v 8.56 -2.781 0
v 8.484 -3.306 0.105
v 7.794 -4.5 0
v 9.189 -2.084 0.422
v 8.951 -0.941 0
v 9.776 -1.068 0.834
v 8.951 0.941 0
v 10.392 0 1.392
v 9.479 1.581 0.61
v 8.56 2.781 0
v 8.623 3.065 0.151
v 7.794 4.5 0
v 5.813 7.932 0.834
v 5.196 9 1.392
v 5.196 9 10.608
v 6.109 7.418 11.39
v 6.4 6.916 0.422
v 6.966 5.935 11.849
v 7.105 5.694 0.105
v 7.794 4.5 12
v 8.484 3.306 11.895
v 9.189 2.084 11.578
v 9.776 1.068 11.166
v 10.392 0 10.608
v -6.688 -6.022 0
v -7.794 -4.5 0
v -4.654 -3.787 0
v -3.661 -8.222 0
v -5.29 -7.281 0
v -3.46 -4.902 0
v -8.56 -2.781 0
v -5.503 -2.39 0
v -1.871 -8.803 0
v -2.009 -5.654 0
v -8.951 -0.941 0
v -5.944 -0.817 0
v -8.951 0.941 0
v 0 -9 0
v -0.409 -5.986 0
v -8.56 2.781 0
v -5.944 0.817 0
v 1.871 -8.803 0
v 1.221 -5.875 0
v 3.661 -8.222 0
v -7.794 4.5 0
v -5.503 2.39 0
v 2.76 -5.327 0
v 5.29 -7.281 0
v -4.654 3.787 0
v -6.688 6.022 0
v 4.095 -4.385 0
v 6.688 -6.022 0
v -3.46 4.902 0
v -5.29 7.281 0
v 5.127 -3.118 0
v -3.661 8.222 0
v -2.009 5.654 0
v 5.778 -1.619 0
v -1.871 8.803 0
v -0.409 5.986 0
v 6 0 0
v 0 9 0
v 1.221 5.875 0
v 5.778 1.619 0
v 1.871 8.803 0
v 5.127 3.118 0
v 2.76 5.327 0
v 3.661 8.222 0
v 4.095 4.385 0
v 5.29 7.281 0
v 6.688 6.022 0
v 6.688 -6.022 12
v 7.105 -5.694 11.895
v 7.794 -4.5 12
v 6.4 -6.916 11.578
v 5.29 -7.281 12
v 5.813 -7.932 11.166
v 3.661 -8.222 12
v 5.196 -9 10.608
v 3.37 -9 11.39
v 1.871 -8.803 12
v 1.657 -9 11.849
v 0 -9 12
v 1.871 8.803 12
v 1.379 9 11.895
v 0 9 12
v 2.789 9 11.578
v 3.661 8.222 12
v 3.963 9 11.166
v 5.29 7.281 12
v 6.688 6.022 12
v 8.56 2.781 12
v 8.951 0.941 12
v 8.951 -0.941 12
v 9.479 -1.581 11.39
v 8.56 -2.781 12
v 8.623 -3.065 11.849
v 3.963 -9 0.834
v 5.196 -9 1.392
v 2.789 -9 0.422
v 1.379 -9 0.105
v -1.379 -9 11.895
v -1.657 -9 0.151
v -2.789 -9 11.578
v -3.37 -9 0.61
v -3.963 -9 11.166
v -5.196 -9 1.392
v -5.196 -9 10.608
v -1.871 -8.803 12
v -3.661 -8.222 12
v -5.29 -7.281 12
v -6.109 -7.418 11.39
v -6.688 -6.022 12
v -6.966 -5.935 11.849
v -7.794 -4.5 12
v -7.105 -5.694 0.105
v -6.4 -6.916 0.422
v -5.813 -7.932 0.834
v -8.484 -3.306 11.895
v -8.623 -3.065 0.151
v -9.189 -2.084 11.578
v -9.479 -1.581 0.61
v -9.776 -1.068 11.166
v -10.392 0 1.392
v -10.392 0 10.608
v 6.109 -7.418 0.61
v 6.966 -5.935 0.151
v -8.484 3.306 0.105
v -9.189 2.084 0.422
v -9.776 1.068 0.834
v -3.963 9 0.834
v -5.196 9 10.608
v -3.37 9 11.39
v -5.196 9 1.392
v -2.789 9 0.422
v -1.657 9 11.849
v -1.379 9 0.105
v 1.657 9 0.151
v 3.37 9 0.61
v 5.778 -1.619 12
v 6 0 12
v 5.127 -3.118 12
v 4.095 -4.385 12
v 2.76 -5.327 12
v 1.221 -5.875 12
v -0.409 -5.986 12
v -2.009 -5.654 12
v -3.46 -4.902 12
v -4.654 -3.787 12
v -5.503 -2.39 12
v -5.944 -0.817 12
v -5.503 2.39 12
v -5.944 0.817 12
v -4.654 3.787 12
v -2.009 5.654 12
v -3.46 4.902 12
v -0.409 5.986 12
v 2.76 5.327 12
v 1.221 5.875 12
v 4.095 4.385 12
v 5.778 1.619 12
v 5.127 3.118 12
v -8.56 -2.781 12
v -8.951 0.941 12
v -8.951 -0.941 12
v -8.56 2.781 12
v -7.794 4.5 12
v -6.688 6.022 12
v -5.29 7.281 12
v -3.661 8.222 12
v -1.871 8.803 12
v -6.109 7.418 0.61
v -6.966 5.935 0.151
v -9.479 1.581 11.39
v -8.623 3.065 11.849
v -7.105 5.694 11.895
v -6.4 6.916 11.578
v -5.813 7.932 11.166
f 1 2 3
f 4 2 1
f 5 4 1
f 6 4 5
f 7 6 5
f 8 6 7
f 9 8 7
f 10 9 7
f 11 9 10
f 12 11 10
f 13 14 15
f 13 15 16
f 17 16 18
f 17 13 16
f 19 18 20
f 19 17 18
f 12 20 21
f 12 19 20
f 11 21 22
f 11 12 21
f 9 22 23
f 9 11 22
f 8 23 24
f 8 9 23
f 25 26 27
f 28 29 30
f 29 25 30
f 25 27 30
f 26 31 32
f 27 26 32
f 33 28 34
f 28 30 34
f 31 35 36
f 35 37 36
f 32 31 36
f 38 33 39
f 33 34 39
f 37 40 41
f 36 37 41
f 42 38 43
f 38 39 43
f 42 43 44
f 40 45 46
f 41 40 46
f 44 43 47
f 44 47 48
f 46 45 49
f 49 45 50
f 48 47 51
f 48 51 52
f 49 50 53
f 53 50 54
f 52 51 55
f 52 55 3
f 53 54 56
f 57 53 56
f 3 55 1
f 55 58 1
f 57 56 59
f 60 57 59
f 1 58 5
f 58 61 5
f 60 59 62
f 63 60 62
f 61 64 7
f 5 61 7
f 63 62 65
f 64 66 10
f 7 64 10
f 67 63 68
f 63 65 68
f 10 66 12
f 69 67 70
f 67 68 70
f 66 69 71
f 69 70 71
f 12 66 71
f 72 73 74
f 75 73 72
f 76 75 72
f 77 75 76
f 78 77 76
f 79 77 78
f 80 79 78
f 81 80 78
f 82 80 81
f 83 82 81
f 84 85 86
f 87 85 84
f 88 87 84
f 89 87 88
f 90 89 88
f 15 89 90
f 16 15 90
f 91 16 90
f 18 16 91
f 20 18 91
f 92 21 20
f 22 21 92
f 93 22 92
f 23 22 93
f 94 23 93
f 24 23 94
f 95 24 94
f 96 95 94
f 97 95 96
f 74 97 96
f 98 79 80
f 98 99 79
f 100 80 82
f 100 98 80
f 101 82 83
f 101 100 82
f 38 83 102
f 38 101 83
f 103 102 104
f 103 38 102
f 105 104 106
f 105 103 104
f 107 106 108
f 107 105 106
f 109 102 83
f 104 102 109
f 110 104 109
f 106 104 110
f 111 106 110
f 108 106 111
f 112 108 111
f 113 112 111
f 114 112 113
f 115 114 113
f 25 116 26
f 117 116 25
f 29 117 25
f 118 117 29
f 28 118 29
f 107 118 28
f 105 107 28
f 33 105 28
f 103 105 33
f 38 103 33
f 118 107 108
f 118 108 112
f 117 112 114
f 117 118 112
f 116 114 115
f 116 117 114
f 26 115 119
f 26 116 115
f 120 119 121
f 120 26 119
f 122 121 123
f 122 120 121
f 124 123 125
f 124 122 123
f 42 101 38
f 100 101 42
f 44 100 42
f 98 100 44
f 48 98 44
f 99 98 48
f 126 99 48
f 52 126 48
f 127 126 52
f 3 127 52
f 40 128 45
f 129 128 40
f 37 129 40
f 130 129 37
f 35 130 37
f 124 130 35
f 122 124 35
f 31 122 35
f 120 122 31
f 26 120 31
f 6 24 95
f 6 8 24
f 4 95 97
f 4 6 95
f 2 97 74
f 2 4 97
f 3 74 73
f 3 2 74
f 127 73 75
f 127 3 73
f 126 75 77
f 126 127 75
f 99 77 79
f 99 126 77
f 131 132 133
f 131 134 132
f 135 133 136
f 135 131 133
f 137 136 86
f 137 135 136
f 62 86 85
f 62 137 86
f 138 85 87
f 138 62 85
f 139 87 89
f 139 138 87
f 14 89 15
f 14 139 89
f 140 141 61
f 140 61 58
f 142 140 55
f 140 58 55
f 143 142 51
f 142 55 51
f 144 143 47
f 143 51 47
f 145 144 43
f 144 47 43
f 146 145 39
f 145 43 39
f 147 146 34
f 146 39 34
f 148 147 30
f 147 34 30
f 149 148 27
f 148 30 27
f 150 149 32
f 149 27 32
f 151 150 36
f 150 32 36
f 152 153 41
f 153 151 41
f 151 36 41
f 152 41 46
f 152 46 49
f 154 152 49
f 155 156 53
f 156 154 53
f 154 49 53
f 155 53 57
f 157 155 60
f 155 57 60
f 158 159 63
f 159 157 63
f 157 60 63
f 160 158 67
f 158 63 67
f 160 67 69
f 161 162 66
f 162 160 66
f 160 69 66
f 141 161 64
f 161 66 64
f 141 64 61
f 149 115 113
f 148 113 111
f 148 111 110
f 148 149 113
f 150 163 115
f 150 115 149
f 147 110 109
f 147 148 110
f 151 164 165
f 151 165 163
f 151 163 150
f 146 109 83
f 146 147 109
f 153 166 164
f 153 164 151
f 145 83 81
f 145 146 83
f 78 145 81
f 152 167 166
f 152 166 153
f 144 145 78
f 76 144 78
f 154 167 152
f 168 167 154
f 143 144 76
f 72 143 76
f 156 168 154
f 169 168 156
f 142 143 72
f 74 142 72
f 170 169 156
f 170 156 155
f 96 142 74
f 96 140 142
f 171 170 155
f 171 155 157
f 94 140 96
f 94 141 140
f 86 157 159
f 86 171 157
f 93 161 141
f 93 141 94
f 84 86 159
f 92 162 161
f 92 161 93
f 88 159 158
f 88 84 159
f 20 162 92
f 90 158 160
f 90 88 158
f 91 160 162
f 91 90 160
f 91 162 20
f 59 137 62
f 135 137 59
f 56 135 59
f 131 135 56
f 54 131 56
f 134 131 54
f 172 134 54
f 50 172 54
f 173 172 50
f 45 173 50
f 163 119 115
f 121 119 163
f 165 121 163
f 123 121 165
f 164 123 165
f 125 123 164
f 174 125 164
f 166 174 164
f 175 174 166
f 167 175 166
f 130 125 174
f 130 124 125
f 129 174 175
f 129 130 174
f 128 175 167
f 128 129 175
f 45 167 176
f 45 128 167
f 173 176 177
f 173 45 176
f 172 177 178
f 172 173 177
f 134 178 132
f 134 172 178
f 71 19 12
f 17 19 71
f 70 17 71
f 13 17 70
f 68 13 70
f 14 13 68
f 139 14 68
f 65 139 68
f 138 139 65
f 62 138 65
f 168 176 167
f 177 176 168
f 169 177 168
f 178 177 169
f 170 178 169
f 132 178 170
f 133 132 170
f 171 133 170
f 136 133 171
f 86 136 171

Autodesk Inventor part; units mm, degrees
ref_plane "YZ Plane" through (0, 0, 0) normal (1, 0, 0) x (0, 1, 0)
ref_plane "XZ Plane" through (0, 0, 0) normal (0, 1, 0) x (-1, 0, 0)
ref_plane "XY Plane" through (0, 0, 0) normal (0, 0, 1) x (1, 0, 0)
sketch "Sketch1" plane through (0, 0, 0) normal (0, 0, 1) x (1, 0, 0)
  line L0 (10.3923, 0) -> (5.1962, -9)
  line L1 (5.1962, -9) -> (-5.1962, -9)
  line L2 (-5.1962, -9) -> (-10.3923, 0)
  line L3 (-10.3923, 0) -> (-5.1962, 9)
  line L4 (-5.1962, 9) -> (5.1962, 9)
  line L5 (5.1962, 9) -> (10.3923, 0)
  circle A0 centre (0, 0) radius 6
  dimension "d2" = 18
  dimension "d3" = 12
extrude "Extrusion2" add sketch "Sketch1" along normal blind 12
sketch "Sketch2" plane through (0, 0, 12) normal (0, 0, 1) x (1, 0, 0)
  circle A0 centre (0, 0) radius 6 construction
  circle A1 centre (0, 0) radius 9
  line L0 (-10.3923, 0) -> (-5.1962, -9) construction
extrude "Extrusion3" cut sketch "Sketch2" against normal up to surface (12 mm away) draft 45 keep common part
sketch "Sketch3" plane through (0, 0, 0) normal (0, 0, -1) x (-1, 0, 0)
  circle A0 centre (0, 0) radius 6 construction
  circle A1 centre (0, 0) radius 9
  line L0 (-5.1962, -9) -> (-10.3923, 0) construction
extrude "Extrusion4" cut sketch "Sketch3" against normal up to surface (12 mm away) draft 45 keep common part
thread "Thread1" size "M12x1.25" class "6H" standard "ISO Metric profile" full length
equation "\"d3\" = Screw_DIA"
equation "\"d19\" = 55deg"
equation "\"Sketch4_Pitch\" = 1.25"
equation "\"Screw_DIA\" = 12"
properties part number "ISO 7040 - M12" material "STEEL, AISI 1015"
